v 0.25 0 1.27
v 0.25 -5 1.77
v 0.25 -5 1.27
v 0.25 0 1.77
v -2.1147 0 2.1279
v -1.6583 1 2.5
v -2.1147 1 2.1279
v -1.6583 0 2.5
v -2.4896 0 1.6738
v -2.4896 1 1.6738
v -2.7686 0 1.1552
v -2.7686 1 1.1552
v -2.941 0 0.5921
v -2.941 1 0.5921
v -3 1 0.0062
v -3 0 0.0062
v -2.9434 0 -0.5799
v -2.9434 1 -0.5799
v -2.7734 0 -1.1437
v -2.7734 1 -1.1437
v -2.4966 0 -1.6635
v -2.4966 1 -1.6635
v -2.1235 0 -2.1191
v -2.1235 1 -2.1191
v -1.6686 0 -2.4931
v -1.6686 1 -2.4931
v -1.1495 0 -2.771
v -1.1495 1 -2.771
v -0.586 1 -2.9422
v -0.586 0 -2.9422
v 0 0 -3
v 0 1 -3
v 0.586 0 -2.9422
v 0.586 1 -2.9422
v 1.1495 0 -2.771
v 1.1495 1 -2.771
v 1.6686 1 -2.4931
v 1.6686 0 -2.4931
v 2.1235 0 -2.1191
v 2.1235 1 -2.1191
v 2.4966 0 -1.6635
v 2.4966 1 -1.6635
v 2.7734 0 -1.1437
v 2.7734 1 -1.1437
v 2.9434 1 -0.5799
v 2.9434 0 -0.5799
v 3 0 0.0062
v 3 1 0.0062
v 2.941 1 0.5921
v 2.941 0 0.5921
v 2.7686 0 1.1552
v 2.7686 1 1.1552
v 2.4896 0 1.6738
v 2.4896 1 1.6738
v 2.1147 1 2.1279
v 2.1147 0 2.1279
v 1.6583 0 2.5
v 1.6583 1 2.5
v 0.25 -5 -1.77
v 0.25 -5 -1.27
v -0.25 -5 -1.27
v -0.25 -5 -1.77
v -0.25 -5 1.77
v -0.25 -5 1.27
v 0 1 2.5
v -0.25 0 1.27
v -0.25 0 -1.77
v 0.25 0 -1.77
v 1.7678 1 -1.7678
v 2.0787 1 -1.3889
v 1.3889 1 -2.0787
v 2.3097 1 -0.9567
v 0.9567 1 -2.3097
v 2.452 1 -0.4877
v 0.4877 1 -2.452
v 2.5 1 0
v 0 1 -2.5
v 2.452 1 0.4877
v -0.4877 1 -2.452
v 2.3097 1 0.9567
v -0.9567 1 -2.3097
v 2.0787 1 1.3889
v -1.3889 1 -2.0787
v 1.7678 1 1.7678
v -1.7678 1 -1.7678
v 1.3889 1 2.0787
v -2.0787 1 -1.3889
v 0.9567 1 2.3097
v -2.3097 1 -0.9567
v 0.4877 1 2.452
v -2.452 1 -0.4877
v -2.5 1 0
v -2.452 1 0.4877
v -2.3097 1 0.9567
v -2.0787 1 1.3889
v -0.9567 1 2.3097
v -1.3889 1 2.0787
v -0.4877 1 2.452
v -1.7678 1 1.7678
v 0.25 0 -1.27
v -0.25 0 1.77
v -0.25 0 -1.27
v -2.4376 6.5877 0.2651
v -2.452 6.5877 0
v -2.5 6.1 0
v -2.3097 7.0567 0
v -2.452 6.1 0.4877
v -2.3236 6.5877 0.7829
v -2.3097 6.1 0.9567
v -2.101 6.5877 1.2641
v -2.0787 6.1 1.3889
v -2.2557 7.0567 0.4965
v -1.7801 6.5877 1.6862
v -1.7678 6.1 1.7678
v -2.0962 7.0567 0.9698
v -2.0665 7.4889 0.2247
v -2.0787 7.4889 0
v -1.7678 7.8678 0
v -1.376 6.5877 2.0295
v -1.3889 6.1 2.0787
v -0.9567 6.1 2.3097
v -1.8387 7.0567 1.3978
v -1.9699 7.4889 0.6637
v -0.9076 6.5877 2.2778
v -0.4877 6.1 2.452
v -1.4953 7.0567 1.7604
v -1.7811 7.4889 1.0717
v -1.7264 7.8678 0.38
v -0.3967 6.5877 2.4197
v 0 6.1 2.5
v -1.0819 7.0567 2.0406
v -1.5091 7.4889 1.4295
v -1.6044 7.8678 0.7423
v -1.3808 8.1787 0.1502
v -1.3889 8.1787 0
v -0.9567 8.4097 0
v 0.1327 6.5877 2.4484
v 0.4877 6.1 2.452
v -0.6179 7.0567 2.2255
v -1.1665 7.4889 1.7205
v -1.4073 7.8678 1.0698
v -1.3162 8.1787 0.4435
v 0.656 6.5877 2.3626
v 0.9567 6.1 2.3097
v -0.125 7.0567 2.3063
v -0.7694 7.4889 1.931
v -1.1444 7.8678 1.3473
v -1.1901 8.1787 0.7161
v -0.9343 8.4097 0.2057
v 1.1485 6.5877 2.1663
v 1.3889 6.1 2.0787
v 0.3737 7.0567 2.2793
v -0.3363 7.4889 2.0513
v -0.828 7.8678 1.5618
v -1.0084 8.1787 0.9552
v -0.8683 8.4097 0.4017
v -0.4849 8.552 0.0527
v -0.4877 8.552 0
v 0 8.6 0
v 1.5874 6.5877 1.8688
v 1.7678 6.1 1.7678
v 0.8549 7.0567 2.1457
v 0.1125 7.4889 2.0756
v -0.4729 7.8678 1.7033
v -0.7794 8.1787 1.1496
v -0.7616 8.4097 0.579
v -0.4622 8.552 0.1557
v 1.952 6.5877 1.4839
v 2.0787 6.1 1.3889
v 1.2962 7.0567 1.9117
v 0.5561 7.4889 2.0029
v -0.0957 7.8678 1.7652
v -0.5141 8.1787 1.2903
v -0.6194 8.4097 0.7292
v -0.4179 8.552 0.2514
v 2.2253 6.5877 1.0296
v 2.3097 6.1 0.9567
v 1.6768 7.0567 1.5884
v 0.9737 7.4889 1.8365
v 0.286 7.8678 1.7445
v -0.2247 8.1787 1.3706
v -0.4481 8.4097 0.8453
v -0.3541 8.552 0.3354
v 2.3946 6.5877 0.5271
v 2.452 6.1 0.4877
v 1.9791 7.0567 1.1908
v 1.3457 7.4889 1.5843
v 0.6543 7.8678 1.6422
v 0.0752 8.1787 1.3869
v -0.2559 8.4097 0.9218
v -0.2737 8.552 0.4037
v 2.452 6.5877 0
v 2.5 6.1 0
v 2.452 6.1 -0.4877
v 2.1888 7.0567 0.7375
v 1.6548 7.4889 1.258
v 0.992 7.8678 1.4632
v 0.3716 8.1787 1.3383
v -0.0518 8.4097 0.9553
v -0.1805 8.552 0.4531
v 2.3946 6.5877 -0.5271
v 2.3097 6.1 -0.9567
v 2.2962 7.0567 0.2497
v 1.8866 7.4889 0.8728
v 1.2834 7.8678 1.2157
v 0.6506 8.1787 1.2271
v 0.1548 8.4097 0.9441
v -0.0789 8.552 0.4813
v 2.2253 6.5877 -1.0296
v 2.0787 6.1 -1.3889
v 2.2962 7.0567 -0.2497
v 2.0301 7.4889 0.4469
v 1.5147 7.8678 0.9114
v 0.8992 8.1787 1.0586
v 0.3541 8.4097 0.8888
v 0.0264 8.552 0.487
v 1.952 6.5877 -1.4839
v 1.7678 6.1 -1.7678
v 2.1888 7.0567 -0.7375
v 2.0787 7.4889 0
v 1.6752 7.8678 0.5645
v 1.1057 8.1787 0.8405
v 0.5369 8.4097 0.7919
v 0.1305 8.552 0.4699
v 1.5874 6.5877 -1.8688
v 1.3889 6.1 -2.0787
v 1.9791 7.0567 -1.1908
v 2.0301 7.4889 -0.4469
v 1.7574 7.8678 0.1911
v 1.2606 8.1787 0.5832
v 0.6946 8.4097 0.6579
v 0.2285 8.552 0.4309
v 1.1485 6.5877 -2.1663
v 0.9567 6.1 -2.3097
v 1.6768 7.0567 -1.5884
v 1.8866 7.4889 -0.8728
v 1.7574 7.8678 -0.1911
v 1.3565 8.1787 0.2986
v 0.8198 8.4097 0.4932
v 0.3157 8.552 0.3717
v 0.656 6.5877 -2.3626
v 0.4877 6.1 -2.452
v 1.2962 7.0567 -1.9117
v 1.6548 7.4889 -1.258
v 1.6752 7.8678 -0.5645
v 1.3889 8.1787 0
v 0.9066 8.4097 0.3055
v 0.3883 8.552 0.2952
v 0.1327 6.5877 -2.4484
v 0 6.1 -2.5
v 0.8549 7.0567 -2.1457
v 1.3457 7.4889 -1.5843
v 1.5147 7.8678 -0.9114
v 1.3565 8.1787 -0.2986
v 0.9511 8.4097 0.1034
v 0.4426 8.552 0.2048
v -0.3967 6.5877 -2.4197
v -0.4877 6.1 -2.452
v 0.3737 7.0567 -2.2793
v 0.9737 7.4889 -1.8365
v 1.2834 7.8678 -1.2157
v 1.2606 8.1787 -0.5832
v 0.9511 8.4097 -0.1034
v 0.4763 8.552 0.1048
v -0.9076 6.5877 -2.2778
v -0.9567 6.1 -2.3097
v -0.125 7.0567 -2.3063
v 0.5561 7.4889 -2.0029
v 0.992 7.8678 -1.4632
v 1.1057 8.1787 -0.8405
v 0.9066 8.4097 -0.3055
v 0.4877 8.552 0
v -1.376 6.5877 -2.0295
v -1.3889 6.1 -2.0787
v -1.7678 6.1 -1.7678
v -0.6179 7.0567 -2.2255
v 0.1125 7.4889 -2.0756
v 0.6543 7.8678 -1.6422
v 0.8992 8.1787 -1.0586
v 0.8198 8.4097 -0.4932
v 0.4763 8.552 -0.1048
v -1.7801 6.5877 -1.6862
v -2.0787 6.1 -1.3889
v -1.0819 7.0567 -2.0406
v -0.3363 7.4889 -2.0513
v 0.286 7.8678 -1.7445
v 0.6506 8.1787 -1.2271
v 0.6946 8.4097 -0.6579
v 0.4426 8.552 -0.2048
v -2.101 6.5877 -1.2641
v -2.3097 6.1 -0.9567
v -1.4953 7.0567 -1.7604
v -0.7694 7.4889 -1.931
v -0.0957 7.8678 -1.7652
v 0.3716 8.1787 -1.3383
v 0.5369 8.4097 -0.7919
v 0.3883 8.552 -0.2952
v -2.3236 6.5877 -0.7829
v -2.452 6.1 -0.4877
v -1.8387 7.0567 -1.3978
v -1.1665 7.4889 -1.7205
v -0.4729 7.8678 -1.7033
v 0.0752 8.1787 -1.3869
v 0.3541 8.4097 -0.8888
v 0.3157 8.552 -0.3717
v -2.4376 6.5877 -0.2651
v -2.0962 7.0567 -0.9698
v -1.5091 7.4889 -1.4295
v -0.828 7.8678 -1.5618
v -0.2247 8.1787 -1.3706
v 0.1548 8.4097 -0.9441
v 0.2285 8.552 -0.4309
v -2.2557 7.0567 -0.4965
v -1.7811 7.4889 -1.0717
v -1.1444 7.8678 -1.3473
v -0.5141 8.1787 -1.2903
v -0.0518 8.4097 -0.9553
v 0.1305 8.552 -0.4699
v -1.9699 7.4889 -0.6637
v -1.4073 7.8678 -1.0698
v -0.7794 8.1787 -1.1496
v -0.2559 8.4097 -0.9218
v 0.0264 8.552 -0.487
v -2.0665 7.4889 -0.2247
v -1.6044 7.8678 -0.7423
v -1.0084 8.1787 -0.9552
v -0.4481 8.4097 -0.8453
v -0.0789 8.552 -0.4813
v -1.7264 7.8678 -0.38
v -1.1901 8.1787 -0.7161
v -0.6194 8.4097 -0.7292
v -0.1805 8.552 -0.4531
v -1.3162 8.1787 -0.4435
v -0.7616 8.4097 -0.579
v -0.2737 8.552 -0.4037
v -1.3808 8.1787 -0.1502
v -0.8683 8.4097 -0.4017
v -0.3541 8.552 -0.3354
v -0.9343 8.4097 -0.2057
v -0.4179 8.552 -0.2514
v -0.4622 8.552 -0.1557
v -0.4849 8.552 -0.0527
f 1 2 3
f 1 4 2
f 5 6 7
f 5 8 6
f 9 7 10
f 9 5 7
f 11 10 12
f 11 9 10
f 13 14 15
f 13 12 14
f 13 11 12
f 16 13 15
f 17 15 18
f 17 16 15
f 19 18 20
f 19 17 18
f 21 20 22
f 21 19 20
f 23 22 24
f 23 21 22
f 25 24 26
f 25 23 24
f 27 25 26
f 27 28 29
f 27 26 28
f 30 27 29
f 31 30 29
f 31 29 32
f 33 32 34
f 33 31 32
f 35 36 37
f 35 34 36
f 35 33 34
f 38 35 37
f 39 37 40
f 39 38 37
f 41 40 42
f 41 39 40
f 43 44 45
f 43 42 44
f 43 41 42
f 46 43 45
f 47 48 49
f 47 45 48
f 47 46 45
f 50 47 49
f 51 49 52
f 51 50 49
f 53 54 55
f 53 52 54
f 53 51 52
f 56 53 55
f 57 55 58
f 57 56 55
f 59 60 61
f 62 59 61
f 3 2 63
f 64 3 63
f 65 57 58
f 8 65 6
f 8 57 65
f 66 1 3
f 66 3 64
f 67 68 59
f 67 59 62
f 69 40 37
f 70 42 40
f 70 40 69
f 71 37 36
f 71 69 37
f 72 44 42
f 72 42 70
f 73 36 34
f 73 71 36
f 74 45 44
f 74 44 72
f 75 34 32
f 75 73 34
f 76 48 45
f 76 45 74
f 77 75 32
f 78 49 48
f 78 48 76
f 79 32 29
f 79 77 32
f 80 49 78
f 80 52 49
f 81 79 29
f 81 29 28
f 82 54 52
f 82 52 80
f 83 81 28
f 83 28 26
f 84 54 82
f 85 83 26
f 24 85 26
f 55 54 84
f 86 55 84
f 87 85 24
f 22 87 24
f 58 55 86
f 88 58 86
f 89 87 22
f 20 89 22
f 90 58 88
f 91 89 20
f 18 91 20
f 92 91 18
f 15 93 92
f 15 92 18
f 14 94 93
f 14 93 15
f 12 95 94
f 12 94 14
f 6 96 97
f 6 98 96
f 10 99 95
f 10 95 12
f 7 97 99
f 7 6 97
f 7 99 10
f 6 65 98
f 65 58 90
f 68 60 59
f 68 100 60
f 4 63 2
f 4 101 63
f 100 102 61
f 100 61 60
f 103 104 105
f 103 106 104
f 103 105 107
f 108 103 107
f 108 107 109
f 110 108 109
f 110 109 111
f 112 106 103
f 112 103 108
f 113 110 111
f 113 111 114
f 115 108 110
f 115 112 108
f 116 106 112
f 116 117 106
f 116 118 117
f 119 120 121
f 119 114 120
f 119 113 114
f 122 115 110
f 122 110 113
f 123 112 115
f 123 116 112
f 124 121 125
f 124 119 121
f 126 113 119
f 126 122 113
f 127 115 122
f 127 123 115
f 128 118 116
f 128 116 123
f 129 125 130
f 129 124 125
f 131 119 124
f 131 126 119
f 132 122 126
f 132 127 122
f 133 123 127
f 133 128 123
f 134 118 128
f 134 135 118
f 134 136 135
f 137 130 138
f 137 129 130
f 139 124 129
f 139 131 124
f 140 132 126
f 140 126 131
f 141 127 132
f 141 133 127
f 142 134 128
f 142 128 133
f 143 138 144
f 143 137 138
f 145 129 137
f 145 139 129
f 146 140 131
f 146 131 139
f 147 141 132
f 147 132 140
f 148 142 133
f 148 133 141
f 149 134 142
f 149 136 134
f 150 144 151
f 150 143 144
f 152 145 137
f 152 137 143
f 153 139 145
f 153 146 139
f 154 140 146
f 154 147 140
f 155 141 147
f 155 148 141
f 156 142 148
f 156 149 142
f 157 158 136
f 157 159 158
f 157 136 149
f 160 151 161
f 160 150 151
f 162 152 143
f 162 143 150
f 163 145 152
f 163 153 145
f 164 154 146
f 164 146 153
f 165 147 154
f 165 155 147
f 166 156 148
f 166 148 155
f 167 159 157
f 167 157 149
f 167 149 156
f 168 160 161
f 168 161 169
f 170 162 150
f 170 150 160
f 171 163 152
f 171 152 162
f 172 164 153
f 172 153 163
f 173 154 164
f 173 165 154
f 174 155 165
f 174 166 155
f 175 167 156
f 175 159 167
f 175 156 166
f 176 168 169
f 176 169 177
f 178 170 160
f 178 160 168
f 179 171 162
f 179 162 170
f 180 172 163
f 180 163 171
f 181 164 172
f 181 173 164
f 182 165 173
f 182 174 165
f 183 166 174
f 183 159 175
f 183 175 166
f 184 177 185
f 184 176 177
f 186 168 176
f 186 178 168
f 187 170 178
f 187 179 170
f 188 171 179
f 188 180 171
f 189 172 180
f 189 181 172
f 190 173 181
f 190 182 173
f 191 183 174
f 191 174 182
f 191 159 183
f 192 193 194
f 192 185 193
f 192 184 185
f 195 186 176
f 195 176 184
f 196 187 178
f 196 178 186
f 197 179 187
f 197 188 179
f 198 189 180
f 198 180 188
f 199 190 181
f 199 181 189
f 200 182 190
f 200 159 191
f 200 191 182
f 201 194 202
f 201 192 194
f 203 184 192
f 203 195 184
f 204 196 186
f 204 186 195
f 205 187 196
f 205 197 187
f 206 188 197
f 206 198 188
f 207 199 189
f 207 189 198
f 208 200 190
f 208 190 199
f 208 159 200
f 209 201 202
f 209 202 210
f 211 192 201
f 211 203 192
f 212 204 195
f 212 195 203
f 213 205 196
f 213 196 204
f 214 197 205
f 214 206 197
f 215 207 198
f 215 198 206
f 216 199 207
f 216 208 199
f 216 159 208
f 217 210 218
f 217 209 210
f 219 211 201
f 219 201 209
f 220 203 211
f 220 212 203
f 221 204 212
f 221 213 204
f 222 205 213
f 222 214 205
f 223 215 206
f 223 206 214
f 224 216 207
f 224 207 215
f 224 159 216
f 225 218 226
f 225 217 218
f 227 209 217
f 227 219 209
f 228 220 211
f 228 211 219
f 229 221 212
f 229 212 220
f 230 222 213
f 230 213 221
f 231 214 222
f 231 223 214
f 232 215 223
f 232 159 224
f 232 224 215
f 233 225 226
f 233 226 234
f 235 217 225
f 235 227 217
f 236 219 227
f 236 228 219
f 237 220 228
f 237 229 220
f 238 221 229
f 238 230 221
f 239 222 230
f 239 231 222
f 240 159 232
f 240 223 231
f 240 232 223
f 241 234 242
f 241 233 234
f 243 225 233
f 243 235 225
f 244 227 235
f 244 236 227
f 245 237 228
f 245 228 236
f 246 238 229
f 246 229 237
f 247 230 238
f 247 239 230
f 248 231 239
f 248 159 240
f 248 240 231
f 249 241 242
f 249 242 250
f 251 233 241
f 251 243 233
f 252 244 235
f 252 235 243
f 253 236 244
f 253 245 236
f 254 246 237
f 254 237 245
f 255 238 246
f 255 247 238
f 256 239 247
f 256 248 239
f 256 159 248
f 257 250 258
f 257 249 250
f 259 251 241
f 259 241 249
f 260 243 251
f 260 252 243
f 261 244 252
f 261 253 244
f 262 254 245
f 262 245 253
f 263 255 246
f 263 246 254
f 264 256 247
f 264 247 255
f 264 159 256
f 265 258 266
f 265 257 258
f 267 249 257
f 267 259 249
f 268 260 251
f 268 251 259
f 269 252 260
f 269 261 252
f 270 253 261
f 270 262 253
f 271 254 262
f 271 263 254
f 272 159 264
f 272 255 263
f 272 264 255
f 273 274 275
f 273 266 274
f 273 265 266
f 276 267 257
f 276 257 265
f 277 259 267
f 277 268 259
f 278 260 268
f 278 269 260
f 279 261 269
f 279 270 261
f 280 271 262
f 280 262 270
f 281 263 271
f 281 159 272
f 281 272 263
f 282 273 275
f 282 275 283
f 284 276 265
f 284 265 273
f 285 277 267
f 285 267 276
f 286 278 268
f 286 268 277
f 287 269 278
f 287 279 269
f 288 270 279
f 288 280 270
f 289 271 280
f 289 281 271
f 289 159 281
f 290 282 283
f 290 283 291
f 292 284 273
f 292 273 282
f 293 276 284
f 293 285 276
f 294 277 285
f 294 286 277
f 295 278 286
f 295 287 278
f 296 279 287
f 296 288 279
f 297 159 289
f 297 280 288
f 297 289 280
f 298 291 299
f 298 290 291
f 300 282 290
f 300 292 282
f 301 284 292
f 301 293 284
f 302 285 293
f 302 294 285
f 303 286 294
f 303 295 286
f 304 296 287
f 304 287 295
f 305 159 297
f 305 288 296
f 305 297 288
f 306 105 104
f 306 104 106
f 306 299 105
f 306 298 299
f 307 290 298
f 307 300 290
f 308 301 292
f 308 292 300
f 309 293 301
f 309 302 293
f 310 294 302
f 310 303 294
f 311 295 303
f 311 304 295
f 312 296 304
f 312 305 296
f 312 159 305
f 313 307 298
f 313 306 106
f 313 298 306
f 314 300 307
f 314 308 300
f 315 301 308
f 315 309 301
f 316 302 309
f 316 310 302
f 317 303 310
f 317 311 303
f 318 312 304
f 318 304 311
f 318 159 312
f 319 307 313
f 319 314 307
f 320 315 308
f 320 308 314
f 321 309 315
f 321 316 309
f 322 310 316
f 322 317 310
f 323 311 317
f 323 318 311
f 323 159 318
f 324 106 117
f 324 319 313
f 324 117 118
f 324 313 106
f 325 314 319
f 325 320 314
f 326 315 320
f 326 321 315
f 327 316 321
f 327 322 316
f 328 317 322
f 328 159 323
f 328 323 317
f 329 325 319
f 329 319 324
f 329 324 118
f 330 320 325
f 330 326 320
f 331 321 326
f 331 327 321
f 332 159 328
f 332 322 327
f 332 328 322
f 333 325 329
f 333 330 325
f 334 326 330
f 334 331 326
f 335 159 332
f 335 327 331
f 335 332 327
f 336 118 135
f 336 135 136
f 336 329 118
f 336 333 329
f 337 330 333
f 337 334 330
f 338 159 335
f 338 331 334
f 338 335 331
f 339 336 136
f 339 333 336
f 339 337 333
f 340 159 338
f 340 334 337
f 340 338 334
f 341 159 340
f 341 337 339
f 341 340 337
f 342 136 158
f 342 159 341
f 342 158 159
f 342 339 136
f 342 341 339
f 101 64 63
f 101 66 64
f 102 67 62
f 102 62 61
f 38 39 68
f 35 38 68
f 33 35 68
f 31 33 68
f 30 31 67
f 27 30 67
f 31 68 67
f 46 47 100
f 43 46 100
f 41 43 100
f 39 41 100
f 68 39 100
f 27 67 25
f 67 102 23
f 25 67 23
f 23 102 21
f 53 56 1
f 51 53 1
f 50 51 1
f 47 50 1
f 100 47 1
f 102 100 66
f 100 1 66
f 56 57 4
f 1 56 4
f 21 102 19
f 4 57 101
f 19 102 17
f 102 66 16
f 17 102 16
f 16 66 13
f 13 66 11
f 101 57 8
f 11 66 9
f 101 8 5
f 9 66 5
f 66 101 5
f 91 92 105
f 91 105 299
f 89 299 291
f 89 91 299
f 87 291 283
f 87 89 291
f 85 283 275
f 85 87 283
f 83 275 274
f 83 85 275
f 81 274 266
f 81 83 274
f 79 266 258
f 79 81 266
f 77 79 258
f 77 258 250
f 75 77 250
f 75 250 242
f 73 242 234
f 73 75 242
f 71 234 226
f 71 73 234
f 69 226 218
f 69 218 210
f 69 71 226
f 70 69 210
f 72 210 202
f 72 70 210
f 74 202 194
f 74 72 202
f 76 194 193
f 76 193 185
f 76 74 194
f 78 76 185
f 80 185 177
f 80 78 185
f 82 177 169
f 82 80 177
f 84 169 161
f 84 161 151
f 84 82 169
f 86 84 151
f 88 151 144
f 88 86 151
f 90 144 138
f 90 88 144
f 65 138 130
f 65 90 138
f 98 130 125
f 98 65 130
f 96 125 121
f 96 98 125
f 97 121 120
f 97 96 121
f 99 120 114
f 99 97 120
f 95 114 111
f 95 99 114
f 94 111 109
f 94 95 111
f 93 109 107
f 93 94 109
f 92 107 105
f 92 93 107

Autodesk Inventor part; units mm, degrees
ref_plane "YZ Plane" through (0, 0, 0) normal (1, 0, 0) x (0, 1, 0)
ref_plane "XZ Plane" through (0, 0, 0) normal (0, 1, 0) x (-1, 0, 0)
ref_plane "XY Plane" through (0, 0, 0) normal (0, 0, 1) x (1, 0, 0)
sketch "Sketch1" plane through (0, 0, 0) normal (0, 1, 0) x (-1, 0, 0)
  arc A0 (-1.6583, 2.5) -> (1.6583, 2.5) centre (0, 0) ccw
  circle A1 centre (0, 0) radius 2.5
  line L0 (0.25, 1.77) -> (-0.25, 1.77)
  line L1 (-0.25, 1.77) -> (-0.25, 1.27)
  line L2 (-0.25, 1.27) -> (0.25, 1.27)
  line L3 (0.25, 1.27) -> (0.25, 1.77)
  line L4 (0, 1.87) -> (0, -2) construction
  line L5 (1.5109, 0) -> (-1.3865, 0) construction
  line L6 (0.25, -1.27) -> (-0.25, -1.27)
  line L7 (-0.25, -1.27) -> (-0.25, -1.77)
  line L8 (-0.25, -1.77) -> (0.25, -1.77)
  line L9 (0.25, -1.77) -> (0.25, -1.27)
  line L10 (-1.6583, 2.5) -> (1.6583, 2.5)
  dimension "d0" = 6
  dimension "d1" = 5
  dimension "d2" = 0.5
  dimension "d4" = 0.5
  dimension "d5" = 2.54
extrude "Extrusion1" add sketch "Sketch1" along normal blind 8.6 contours A1 | L3 L2 L1 L0 | L9 L8 L7 L6
extrude "Extrusion3" add sketch "Sketch1" along normal blind 1 contours L10 A0
fillet "Fillet1" radius 2.5 1 edges at (2.5, 8.6, 0)
extrude "Extrusion4" add sketch "Sketch1" against normal blind 5 contours L3 L2 L1 L0 | L9 L8 L7 L6
properties part number "LED"
